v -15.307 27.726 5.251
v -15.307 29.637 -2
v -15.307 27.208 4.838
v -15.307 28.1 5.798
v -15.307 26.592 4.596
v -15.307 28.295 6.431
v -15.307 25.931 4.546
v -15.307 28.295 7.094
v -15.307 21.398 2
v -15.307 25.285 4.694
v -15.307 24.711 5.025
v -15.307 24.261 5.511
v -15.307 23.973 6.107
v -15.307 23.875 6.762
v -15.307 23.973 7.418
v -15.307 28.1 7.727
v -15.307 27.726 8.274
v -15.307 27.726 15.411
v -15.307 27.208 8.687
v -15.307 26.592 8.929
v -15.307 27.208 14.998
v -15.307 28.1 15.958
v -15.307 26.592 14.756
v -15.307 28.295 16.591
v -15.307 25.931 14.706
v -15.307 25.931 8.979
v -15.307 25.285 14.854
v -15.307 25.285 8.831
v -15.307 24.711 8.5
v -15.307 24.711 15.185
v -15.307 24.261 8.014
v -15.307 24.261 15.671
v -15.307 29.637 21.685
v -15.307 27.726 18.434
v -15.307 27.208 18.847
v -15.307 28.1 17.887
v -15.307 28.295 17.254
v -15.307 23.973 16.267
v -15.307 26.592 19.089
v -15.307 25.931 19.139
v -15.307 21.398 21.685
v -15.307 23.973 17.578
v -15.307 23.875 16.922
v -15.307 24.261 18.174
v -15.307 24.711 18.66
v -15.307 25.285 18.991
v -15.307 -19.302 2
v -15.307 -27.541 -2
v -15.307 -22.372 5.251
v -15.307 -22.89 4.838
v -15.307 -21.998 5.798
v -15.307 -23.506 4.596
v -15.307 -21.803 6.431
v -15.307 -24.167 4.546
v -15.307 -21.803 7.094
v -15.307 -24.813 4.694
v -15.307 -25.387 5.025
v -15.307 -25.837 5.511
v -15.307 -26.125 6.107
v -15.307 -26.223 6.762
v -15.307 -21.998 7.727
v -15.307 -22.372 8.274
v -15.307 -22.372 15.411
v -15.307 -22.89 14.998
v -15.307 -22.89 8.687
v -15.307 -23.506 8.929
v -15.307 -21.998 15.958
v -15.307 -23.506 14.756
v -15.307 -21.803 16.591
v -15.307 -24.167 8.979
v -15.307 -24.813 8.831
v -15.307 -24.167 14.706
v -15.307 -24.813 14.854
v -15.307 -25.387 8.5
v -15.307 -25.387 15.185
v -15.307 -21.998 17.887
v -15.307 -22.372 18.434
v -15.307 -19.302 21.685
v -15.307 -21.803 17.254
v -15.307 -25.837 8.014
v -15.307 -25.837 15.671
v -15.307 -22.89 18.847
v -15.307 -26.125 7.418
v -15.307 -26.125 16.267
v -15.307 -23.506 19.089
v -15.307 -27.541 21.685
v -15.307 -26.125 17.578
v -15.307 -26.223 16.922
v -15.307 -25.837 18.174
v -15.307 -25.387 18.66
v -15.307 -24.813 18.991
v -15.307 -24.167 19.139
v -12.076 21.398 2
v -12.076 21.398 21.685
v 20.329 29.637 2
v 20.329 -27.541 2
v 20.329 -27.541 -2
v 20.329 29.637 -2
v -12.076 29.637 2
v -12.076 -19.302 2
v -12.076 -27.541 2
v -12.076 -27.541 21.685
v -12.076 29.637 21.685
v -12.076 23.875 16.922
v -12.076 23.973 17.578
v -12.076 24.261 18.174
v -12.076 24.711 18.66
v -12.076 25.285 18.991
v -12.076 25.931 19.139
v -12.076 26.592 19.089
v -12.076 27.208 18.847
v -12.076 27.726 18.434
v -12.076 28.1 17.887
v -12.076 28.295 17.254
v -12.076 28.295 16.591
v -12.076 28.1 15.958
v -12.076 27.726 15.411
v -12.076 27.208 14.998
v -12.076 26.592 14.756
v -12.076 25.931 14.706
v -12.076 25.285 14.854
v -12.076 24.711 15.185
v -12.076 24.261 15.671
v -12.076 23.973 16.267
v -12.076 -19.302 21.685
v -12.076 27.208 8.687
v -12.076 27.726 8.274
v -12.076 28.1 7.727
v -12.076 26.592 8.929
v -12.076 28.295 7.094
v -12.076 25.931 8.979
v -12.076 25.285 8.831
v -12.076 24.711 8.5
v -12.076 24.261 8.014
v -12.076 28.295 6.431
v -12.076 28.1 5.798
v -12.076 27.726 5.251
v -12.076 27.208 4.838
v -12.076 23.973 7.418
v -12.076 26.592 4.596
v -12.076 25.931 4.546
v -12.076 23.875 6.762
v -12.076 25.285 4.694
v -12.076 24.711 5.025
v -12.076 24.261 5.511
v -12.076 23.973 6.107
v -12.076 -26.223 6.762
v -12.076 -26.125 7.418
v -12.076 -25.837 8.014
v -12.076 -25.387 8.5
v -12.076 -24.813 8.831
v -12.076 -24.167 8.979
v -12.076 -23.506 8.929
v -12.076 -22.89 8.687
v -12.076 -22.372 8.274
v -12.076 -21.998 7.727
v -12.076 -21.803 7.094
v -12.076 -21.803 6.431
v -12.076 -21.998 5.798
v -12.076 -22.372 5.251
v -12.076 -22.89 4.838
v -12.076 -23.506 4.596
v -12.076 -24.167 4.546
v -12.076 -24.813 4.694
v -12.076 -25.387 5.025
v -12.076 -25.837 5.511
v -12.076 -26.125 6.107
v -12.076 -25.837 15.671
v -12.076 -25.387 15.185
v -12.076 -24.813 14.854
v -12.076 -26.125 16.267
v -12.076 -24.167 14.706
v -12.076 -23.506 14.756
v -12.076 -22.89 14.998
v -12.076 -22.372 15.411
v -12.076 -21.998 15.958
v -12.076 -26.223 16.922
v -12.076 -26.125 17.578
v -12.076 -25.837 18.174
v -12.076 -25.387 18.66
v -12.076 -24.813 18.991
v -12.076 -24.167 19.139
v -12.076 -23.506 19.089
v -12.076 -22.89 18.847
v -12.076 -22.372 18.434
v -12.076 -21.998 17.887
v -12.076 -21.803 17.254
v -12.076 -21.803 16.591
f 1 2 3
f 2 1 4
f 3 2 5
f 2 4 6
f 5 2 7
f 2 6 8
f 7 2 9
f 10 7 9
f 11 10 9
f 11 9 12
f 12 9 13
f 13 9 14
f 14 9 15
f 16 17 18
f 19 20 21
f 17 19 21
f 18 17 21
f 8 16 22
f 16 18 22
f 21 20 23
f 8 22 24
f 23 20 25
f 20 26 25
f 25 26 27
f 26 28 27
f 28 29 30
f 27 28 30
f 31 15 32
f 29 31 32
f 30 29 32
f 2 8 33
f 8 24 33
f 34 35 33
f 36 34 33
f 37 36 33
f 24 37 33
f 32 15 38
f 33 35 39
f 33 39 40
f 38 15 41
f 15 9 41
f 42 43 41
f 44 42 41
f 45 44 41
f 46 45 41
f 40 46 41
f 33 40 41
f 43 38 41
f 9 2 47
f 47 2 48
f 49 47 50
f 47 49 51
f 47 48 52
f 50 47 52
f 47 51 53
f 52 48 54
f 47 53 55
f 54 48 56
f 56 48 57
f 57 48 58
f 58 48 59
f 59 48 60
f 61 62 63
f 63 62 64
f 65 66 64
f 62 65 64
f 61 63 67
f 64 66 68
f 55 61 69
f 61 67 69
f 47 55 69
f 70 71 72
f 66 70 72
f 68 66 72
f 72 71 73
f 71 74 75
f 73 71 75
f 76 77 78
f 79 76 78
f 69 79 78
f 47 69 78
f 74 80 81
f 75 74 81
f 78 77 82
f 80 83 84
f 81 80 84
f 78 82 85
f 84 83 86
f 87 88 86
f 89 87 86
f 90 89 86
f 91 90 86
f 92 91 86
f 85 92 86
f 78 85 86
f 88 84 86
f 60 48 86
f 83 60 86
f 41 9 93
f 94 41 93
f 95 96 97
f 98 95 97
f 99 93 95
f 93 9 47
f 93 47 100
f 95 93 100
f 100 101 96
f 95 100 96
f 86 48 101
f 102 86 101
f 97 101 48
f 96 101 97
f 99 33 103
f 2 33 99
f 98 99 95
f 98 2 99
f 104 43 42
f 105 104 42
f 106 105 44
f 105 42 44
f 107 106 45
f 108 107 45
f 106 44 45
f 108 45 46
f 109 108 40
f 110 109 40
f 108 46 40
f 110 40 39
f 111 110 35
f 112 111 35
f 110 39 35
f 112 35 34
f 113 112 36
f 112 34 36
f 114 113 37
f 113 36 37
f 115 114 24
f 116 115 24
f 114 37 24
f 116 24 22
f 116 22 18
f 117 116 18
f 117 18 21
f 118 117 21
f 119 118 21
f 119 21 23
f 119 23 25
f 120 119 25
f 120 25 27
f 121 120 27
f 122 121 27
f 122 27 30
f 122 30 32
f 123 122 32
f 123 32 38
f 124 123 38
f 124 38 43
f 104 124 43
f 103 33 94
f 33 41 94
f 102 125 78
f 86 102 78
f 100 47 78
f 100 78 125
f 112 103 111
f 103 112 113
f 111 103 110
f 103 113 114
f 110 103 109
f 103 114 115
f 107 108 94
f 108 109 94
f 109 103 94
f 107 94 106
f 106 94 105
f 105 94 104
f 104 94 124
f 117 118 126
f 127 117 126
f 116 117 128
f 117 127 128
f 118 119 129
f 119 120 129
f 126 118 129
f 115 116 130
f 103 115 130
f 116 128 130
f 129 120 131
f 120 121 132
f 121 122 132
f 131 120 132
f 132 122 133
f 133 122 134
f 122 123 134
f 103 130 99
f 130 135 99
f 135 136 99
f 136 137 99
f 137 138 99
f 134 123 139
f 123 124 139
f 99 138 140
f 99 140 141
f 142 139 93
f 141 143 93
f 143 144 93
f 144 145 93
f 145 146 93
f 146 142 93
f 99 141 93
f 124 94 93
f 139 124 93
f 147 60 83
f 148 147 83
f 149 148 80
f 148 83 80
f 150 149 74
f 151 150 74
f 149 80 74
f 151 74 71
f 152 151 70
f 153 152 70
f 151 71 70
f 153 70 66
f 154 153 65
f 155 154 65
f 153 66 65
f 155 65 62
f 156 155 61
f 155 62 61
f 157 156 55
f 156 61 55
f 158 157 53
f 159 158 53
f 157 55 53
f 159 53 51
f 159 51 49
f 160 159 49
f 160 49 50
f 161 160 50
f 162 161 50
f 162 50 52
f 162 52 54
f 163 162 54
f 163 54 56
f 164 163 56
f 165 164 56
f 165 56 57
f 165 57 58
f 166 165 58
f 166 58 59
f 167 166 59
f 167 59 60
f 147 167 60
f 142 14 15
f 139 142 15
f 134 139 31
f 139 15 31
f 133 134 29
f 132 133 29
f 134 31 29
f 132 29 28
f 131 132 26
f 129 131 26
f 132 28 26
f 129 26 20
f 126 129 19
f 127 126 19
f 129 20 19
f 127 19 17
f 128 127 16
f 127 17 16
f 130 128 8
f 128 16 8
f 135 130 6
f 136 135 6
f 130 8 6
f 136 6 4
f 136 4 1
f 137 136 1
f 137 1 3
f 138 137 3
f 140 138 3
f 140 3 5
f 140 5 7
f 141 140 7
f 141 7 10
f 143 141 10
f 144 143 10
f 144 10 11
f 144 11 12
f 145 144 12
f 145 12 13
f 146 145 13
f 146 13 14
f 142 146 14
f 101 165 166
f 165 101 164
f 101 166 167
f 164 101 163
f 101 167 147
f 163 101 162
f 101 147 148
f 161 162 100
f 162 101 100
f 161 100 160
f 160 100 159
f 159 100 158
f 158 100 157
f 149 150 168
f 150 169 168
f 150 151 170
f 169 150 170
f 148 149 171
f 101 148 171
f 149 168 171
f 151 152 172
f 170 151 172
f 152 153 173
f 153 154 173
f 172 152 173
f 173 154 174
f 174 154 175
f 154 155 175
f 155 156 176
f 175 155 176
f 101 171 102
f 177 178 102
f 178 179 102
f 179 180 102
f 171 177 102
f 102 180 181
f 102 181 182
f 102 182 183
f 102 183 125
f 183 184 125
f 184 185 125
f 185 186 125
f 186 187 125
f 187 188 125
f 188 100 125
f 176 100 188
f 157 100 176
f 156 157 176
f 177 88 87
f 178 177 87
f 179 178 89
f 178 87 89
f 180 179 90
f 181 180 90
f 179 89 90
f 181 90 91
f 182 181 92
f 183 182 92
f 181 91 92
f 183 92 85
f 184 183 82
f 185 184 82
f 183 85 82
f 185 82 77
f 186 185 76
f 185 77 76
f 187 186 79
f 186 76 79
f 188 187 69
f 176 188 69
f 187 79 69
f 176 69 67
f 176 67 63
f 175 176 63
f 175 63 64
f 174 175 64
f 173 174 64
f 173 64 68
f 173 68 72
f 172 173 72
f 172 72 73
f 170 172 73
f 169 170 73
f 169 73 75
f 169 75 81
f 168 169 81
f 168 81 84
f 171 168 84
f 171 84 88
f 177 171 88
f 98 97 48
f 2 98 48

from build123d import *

# Parameters (mm, degrees)
SKETCH1_W           = 35.636
SKETCH1_H           = 55.178
BOSS_EXTRUDE1_DEPTH = 2
SKETCH2_W           = 3.23086443
SKETCH2_H           = 7.239
BOSS_EXTRUDE2_DEPTH = 19.685
SKETCH3_R           = 2.2225
CUT_EXTRUDE1_DEPTH  = 51.598920687
BOSS_EXTRUDE4_DEPTH = 1
BOSS_EXTRUDE5_DEPTH = 1


with BuildPart() as part:
    # Sketch1 → Boss-Extrude1 (new, symmetric)
    with BuildSketch(Plane.XY):
        with Locations((2.511331614, 1.04816211)):
            Rectangle(SKETCH1_W, SKETCH1_H)
    extrude(amount=BOSS_EXTRUDE1_DEPTH, both=True)

    # Sketch2 → Boss-Extrude2 (add)
    with BuildSketch(Plane.XY.offset(2)):
        with Locations((-13.691236171, 25.01766211)):
            Rectangle(SKETCH2_W, SKETCH2_H)
        with Locations((-13.691236171, -22.92133789)):
            Rectangle(SKETCH2_W, SKETCH2_H)
    extrude(amount=BOSS_EXTRUDE2_DEPTH)

    # Sketch3 → Cut-Extrude1 (cut, through all)
    with BuildSketch(Plane.ZY.offset(15.306668386)):
        with Locations(Location((16.9225, 26.09716211, 0), (0, 0, 270))):
            Circle(SKETCH3_R)
        with Locations(Location((16.9225, -24.00083789, 0), (0, 0, 270))):
            Circle(SKETCH3_R)
        with Locations(Location((6.7625, 26.09716211, 0), (0, 0, 270))):
            Circle(SKETCH3_R)
        with Locations(Location((6.7625, -24.00083789, 0), (0, 0, 270))):
            Circle(SKETCH3_R)
    extrude(amount=-CUT_EXTRUDE1_DEPTH, mode=Mode.SUBTRACT)

    # Sketch5 → Boss-Extrude4 (add)
    with BuildSketch(Plane.XZ.offset(26.54083789)):
        Polygon((-15.306668386, -2), (20.329331614, -2), (20.329331614, 2), (-12.075803956, 2), (-12.075803956, 21.685), (-15.306668386, 21.685), align=None)
    extrude(amount=BOSS_EXTRUDE4_DEPTH)

    # Sketch6 → Boss-Extrude5 (add)
    with BuildSketch(Plane(origin=(0, 28.63716211, 0), x_dir=(1, 0, 0), z_dir=(0, 1, 0))):
        Polygon((20.329331614, 2), (-15.306668386, 2), (-15.306668386, -21.685), (-12.075803956, -21.685), (-12.075803956, -2), (20.329331614, -2), align=None)
    extrude(amount=BOSS_EXTRUDE5_DEPTH)


solid = part.part
